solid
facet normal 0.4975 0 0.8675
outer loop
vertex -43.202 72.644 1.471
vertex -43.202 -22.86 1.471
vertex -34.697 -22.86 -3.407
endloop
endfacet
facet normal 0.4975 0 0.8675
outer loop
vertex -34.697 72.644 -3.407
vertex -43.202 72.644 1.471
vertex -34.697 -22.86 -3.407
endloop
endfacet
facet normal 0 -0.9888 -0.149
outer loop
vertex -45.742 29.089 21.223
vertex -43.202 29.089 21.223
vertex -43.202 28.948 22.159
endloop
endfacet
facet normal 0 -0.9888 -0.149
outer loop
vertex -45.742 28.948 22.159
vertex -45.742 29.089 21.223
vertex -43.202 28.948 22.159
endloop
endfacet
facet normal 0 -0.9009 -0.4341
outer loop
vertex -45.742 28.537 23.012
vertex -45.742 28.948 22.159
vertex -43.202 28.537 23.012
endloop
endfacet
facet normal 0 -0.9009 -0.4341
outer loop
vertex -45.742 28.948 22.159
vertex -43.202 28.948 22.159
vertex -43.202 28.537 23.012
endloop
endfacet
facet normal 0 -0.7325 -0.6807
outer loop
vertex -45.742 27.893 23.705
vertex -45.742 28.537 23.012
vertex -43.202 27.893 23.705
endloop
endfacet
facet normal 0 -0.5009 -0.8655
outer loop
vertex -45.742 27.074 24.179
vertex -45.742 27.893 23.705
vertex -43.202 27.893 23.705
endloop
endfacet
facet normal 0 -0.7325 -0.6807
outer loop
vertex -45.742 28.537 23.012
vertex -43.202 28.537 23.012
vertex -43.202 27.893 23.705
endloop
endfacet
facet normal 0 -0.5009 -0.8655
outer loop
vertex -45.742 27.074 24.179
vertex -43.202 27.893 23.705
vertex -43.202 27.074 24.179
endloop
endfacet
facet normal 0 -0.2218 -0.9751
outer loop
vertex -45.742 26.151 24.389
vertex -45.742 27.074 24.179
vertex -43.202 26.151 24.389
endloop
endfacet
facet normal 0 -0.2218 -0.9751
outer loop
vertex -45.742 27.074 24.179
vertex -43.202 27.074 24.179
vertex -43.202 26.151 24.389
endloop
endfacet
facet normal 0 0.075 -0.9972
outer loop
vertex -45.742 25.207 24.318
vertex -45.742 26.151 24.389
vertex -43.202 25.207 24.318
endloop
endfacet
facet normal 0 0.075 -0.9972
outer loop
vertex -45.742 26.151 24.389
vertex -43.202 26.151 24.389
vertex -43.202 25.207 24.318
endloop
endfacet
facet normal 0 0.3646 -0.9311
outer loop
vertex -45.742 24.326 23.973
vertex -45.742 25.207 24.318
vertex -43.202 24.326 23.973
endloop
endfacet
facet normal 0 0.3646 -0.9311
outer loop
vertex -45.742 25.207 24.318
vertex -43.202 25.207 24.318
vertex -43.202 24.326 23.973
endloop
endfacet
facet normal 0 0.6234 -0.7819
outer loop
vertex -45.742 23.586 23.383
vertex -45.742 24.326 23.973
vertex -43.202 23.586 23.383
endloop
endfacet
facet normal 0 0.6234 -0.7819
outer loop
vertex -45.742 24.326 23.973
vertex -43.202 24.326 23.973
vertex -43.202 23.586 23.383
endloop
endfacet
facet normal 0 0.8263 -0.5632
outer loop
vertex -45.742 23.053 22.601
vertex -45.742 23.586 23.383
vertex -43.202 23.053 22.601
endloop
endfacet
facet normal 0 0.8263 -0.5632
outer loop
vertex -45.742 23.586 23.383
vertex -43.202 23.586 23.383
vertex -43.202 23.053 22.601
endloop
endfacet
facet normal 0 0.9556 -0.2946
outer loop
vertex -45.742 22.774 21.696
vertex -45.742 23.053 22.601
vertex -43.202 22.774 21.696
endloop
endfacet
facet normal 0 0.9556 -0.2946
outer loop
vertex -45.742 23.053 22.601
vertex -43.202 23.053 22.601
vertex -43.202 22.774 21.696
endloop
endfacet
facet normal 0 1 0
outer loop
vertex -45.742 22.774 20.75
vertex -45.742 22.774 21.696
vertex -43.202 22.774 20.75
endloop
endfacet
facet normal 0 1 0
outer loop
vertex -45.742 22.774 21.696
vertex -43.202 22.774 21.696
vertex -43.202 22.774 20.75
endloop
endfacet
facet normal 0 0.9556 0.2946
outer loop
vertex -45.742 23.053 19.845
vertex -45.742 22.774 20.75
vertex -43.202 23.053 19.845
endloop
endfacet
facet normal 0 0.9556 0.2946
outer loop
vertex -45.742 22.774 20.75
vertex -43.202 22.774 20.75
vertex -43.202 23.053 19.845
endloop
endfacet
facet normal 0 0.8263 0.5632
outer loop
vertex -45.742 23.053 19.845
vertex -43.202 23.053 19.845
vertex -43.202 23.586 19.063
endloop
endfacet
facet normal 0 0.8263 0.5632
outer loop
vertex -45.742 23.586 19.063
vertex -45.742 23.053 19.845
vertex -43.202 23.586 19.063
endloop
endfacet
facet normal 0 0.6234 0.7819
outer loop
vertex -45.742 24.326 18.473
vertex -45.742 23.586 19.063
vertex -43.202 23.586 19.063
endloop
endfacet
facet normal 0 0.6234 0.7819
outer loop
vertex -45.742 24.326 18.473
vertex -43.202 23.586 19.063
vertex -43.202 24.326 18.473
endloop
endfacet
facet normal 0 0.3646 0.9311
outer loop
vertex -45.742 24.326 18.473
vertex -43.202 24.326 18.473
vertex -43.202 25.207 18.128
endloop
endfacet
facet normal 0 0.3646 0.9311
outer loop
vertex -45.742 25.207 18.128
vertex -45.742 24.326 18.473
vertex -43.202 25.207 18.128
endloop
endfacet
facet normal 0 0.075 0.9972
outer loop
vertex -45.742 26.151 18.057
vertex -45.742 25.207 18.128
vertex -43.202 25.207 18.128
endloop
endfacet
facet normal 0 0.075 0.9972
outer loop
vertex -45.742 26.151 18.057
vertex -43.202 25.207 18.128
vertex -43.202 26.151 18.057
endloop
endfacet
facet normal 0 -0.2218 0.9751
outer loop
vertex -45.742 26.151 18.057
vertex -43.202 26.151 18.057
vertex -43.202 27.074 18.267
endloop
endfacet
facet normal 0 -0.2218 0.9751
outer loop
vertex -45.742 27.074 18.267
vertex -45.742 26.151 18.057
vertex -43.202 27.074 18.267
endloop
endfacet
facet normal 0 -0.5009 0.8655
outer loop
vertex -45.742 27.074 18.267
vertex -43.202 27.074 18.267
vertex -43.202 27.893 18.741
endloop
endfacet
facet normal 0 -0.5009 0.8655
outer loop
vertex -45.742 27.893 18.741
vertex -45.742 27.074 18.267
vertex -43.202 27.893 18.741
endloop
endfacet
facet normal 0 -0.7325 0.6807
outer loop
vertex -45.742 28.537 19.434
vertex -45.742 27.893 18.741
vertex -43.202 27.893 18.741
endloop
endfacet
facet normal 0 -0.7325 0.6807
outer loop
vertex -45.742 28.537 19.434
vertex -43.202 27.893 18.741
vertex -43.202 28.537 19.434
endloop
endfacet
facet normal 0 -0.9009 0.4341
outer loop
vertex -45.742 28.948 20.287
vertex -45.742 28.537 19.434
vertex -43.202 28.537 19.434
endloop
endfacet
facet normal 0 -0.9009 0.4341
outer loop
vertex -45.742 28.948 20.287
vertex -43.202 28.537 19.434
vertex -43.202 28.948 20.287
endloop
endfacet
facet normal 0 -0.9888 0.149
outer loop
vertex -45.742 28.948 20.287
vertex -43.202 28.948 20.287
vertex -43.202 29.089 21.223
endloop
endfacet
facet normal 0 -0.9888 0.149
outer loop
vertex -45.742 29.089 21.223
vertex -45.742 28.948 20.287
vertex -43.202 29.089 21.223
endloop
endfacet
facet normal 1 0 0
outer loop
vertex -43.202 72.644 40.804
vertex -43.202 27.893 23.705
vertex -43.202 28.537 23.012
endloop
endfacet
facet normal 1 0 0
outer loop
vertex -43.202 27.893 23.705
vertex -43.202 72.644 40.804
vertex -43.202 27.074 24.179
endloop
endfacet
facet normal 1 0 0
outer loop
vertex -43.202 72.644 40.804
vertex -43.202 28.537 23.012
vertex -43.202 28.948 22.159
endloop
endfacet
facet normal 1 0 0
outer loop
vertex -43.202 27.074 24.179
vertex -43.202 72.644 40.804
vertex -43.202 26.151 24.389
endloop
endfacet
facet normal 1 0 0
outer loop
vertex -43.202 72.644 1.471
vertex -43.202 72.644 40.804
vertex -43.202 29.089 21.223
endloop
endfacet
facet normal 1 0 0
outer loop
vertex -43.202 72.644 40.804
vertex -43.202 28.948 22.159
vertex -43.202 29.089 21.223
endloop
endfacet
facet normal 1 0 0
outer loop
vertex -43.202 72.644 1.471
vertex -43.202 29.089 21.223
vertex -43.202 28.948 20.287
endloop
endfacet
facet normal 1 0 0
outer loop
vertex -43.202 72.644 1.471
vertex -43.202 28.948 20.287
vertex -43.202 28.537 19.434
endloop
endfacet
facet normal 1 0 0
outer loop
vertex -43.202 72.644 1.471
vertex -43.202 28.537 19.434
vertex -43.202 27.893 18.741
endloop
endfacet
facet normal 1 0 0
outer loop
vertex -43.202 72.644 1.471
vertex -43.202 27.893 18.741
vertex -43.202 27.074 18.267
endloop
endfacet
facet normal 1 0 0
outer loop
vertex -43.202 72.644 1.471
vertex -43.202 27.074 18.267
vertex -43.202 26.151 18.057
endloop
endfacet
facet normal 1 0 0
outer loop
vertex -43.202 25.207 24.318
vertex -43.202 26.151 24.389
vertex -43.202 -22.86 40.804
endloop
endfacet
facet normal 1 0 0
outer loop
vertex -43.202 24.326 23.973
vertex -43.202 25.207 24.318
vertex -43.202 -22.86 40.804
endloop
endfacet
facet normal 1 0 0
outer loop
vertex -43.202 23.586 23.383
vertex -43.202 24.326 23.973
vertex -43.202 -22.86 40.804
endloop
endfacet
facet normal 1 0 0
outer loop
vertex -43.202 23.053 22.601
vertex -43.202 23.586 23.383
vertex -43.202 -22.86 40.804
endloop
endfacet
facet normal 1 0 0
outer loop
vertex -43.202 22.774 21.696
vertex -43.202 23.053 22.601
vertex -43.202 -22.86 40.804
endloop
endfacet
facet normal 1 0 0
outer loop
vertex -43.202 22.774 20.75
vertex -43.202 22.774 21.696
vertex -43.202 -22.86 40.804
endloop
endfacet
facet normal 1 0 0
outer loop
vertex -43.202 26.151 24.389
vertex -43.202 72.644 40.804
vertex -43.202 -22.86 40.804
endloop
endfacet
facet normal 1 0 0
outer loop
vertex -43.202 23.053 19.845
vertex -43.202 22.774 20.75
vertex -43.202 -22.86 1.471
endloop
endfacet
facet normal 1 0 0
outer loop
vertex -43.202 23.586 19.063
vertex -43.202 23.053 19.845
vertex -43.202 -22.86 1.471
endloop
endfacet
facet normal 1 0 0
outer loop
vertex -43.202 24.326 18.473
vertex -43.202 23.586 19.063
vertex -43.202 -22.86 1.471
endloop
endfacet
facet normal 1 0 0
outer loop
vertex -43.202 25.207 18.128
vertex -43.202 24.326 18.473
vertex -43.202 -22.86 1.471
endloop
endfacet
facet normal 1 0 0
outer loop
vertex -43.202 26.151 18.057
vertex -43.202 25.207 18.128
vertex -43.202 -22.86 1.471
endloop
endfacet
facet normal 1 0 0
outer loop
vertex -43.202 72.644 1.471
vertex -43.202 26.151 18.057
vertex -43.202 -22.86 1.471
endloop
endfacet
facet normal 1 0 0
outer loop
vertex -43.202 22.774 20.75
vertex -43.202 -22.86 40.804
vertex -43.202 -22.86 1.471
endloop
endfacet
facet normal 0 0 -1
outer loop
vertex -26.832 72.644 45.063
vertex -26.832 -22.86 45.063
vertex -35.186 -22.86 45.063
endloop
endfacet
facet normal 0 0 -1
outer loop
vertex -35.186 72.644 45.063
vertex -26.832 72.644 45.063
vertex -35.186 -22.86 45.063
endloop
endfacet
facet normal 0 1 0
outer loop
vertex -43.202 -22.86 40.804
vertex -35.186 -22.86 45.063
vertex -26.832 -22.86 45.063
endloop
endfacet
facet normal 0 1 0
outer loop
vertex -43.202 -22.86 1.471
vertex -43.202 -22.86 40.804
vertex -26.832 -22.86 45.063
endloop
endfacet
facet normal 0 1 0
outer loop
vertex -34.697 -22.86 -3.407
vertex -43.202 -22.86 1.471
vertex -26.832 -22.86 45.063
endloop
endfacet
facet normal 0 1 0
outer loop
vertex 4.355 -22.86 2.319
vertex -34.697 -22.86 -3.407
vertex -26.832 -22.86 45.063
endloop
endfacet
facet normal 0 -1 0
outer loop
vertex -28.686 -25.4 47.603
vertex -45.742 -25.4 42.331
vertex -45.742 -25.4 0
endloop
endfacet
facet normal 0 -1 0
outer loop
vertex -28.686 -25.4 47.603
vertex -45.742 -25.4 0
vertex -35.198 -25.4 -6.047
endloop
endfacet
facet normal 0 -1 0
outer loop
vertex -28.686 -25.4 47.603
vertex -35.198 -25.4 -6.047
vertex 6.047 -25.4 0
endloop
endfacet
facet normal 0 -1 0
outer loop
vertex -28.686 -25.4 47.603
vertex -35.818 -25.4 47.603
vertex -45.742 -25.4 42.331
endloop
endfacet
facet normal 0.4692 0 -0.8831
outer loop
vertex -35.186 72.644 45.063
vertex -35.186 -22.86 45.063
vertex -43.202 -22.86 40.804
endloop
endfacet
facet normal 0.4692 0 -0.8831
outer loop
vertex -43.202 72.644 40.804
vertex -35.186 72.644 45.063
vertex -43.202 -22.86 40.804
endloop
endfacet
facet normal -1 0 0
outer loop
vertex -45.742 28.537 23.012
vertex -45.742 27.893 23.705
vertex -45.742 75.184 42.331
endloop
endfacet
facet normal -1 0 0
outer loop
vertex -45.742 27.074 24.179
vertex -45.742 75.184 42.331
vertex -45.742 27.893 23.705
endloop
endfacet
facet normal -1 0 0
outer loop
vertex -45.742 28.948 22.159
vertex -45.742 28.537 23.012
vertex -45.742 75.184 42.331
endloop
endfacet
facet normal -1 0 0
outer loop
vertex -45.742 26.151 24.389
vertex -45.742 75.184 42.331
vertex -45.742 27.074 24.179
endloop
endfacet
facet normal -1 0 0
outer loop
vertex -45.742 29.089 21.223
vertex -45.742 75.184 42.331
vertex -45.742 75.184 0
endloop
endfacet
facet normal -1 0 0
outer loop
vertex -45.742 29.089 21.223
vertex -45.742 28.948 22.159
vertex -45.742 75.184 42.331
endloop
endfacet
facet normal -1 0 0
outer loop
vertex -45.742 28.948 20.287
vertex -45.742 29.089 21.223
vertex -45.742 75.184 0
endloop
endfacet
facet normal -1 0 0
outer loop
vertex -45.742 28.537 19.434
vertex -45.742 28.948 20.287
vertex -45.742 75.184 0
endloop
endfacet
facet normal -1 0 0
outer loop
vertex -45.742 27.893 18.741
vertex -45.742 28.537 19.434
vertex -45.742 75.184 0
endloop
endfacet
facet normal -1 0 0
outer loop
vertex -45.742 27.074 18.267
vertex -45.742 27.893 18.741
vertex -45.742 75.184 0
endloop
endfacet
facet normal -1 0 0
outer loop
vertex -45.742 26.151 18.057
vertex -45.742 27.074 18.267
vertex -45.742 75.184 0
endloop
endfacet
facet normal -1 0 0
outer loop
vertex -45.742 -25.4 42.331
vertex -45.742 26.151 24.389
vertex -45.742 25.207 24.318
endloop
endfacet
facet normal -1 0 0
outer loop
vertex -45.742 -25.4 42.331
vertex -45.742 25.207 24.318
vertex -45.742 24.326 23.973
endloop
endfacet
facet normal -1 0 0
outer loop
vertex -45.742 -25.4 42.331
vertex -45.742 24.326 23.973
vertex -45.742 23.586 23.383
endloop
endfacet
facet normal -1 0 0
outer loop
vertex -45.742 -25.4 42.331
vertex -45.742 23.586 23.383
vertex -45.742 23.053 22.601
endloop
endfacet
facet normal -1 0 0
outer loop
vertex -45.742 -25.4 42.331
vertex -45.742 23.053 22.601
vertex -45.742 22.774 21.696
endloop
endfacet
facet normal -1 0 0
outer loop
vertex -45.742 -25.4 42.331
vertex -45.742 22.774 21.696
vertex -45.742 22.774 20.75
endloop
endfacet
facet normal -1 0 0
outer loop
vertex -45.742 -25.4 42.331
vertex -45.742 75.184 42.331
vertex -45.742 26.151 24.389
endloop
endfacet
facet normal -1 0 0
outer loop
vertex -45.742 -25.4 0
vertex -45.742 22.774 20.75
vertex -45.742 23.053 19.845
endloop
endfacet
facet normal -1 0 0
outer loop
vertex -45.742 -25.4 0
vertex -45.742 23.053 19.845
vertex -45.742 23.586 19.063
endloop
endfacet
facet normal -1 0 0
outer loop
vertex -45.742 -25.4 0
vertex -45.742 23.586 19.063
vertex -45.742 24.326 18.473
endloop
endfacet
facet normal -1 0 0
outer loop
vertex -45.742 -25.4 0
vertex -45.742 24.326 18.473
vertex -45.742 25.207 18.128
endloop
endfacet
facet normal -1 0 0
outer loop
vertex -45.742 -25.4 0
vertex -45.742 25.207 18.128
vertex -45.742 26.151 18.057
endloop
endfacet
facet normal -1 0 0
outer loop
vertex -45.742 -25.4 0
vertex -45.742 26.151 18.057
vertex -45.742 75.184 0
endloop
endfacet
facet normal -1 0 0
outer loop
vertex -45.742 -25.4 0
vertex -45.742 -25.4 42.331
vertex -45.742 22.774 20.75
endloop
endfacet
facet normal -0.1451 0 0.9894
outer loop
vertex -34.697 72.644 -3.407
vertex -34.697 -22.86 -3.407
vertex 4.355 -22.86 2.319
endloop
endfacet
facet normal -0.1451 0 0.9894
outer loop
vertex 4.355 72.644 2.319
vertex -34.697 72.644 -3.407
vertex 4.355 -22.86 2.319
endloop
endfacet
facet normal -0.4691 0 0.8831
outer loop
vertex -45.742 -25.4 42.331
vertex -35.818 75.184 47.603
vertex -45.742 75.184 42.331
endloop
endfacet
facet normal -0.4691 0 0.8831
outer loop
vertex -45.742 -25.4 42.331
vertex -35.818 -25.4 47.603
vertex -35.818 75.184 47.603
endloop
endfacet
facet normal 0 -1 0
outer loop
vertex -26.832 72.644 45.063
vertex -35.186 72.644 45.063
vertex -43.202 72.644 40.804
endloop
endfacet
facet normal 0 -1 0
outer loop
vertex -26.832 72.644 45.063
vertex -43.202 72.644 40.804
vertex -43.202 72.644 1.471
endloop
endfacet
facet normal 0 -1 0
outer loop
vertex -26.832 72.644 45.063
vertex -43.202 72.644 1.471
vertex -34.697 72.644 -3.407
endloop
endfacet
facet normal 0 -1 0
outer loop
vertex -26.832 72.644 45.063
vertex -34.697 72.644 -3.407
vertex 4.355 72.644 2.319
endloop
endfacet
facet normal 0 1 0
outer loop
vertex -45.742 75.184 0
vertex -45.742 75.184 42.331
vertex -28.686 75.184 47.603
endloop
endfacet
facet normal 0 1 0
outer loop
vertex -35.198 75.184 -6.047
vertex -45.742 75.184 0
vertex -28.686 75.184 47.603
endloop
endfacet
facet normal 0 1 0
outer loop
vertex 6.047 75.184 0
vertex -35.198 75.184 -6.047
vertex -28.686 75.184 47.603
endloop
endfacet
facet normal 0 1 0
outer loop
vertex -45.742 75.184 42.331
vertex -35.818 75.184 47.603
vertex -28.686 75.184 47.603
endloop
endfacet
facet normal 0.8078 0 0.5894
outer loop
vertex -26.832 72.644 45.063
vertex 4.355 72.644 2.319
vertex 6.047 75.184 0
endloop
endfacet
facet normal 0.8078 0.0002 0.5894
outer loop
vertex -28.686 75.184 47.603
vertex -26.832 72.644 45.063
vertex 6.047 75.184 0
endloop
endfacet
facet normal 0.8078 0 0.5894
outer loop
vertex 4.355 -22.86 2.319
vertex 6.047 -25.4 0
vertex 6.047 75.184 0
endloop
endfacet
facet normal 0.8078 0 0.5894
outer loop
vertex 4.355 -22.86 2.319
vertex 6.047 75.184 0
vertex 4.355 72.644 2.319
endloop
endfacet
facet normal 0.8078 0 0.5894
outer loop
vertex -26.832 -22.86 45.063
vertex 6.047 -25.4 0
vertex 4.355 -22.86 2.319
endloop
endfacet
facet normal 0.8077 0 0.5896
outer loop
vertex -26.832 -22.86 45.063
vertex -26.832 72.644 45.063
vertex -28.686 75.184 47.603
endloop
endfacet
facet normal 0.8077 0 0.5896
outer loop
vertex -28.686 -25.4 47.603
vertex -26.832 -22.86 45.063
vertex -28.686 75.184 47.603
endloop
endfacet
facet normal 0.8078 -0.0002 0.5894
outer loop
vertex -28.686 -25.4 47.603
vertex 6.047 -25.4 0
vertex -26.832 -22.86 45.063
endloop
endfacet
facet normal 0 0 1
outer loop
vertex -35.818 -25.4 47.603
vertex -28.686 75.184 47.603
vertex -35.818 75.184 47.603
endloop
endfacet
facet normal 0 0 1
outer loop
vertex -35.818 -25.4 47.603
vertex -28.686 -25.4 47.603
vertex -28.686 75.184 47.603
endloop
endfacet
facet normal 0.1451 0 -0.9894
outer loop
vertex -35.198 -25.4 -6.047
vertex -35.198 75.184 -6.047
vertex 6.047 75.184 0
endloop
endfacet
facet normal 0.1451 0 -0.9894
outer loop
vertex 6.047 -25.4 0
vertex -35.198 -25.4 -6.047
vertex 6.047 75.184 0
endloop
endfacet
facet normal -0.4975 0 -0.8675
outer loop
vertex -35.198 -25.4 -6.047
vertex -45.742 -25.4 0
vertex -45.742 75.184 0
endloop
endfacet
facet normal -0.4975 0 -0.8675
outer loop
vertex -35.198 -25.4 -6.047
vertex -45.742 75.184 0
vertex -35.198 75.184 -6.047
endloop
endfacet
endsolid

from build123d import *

# Parameters (mm, degrees)
F1_DEPTH = 25.4
F2_DEPTH = 75.184
F3_T     = -2.54
F6_D     = 6.35


with BuildPart() as f1:
    # F0 (on Front) → F1 (new body)
    with BuildSketch(Plane.XZ):
        Polygon((-45.7421503961, 42.3308722675), (-45.7421503961, 0), (-35.1981967688, -6.0472674668), (6.0472679324, 0), (-28.6857560277, 47.6028472185), (-35.8184315264, 47.6028472185), align=None)
    extrude(amount=F1_DEPTH)

    # F2 (add): a face of the model
    f2_faces = [f1.faces().sort_by_distance(p)[0] for p in [
        (-26.6568432389, 0, 17.4826734164),
    ]]
    extrude(f2_faces, amount=F2_DEPTH)

    # F3
    f3_openings = [f1.faces().sort_by_distance(p)[0] for p in [
        (-11.319244, 24.892, 23.801424),
    ]]
    offset(amount=F3_T, openings=f3_openings)

    # F6 (through all)
    with Locations(Plane(origin=(-45.7421503961, 0, 0), x_dir=(0, -1, 0), z_dir=(-1, 0, 0))):
        with Locations((-25.9138997644, 21.2229900062)):
            Hole(F6_D / 2)


solid = f1.part
